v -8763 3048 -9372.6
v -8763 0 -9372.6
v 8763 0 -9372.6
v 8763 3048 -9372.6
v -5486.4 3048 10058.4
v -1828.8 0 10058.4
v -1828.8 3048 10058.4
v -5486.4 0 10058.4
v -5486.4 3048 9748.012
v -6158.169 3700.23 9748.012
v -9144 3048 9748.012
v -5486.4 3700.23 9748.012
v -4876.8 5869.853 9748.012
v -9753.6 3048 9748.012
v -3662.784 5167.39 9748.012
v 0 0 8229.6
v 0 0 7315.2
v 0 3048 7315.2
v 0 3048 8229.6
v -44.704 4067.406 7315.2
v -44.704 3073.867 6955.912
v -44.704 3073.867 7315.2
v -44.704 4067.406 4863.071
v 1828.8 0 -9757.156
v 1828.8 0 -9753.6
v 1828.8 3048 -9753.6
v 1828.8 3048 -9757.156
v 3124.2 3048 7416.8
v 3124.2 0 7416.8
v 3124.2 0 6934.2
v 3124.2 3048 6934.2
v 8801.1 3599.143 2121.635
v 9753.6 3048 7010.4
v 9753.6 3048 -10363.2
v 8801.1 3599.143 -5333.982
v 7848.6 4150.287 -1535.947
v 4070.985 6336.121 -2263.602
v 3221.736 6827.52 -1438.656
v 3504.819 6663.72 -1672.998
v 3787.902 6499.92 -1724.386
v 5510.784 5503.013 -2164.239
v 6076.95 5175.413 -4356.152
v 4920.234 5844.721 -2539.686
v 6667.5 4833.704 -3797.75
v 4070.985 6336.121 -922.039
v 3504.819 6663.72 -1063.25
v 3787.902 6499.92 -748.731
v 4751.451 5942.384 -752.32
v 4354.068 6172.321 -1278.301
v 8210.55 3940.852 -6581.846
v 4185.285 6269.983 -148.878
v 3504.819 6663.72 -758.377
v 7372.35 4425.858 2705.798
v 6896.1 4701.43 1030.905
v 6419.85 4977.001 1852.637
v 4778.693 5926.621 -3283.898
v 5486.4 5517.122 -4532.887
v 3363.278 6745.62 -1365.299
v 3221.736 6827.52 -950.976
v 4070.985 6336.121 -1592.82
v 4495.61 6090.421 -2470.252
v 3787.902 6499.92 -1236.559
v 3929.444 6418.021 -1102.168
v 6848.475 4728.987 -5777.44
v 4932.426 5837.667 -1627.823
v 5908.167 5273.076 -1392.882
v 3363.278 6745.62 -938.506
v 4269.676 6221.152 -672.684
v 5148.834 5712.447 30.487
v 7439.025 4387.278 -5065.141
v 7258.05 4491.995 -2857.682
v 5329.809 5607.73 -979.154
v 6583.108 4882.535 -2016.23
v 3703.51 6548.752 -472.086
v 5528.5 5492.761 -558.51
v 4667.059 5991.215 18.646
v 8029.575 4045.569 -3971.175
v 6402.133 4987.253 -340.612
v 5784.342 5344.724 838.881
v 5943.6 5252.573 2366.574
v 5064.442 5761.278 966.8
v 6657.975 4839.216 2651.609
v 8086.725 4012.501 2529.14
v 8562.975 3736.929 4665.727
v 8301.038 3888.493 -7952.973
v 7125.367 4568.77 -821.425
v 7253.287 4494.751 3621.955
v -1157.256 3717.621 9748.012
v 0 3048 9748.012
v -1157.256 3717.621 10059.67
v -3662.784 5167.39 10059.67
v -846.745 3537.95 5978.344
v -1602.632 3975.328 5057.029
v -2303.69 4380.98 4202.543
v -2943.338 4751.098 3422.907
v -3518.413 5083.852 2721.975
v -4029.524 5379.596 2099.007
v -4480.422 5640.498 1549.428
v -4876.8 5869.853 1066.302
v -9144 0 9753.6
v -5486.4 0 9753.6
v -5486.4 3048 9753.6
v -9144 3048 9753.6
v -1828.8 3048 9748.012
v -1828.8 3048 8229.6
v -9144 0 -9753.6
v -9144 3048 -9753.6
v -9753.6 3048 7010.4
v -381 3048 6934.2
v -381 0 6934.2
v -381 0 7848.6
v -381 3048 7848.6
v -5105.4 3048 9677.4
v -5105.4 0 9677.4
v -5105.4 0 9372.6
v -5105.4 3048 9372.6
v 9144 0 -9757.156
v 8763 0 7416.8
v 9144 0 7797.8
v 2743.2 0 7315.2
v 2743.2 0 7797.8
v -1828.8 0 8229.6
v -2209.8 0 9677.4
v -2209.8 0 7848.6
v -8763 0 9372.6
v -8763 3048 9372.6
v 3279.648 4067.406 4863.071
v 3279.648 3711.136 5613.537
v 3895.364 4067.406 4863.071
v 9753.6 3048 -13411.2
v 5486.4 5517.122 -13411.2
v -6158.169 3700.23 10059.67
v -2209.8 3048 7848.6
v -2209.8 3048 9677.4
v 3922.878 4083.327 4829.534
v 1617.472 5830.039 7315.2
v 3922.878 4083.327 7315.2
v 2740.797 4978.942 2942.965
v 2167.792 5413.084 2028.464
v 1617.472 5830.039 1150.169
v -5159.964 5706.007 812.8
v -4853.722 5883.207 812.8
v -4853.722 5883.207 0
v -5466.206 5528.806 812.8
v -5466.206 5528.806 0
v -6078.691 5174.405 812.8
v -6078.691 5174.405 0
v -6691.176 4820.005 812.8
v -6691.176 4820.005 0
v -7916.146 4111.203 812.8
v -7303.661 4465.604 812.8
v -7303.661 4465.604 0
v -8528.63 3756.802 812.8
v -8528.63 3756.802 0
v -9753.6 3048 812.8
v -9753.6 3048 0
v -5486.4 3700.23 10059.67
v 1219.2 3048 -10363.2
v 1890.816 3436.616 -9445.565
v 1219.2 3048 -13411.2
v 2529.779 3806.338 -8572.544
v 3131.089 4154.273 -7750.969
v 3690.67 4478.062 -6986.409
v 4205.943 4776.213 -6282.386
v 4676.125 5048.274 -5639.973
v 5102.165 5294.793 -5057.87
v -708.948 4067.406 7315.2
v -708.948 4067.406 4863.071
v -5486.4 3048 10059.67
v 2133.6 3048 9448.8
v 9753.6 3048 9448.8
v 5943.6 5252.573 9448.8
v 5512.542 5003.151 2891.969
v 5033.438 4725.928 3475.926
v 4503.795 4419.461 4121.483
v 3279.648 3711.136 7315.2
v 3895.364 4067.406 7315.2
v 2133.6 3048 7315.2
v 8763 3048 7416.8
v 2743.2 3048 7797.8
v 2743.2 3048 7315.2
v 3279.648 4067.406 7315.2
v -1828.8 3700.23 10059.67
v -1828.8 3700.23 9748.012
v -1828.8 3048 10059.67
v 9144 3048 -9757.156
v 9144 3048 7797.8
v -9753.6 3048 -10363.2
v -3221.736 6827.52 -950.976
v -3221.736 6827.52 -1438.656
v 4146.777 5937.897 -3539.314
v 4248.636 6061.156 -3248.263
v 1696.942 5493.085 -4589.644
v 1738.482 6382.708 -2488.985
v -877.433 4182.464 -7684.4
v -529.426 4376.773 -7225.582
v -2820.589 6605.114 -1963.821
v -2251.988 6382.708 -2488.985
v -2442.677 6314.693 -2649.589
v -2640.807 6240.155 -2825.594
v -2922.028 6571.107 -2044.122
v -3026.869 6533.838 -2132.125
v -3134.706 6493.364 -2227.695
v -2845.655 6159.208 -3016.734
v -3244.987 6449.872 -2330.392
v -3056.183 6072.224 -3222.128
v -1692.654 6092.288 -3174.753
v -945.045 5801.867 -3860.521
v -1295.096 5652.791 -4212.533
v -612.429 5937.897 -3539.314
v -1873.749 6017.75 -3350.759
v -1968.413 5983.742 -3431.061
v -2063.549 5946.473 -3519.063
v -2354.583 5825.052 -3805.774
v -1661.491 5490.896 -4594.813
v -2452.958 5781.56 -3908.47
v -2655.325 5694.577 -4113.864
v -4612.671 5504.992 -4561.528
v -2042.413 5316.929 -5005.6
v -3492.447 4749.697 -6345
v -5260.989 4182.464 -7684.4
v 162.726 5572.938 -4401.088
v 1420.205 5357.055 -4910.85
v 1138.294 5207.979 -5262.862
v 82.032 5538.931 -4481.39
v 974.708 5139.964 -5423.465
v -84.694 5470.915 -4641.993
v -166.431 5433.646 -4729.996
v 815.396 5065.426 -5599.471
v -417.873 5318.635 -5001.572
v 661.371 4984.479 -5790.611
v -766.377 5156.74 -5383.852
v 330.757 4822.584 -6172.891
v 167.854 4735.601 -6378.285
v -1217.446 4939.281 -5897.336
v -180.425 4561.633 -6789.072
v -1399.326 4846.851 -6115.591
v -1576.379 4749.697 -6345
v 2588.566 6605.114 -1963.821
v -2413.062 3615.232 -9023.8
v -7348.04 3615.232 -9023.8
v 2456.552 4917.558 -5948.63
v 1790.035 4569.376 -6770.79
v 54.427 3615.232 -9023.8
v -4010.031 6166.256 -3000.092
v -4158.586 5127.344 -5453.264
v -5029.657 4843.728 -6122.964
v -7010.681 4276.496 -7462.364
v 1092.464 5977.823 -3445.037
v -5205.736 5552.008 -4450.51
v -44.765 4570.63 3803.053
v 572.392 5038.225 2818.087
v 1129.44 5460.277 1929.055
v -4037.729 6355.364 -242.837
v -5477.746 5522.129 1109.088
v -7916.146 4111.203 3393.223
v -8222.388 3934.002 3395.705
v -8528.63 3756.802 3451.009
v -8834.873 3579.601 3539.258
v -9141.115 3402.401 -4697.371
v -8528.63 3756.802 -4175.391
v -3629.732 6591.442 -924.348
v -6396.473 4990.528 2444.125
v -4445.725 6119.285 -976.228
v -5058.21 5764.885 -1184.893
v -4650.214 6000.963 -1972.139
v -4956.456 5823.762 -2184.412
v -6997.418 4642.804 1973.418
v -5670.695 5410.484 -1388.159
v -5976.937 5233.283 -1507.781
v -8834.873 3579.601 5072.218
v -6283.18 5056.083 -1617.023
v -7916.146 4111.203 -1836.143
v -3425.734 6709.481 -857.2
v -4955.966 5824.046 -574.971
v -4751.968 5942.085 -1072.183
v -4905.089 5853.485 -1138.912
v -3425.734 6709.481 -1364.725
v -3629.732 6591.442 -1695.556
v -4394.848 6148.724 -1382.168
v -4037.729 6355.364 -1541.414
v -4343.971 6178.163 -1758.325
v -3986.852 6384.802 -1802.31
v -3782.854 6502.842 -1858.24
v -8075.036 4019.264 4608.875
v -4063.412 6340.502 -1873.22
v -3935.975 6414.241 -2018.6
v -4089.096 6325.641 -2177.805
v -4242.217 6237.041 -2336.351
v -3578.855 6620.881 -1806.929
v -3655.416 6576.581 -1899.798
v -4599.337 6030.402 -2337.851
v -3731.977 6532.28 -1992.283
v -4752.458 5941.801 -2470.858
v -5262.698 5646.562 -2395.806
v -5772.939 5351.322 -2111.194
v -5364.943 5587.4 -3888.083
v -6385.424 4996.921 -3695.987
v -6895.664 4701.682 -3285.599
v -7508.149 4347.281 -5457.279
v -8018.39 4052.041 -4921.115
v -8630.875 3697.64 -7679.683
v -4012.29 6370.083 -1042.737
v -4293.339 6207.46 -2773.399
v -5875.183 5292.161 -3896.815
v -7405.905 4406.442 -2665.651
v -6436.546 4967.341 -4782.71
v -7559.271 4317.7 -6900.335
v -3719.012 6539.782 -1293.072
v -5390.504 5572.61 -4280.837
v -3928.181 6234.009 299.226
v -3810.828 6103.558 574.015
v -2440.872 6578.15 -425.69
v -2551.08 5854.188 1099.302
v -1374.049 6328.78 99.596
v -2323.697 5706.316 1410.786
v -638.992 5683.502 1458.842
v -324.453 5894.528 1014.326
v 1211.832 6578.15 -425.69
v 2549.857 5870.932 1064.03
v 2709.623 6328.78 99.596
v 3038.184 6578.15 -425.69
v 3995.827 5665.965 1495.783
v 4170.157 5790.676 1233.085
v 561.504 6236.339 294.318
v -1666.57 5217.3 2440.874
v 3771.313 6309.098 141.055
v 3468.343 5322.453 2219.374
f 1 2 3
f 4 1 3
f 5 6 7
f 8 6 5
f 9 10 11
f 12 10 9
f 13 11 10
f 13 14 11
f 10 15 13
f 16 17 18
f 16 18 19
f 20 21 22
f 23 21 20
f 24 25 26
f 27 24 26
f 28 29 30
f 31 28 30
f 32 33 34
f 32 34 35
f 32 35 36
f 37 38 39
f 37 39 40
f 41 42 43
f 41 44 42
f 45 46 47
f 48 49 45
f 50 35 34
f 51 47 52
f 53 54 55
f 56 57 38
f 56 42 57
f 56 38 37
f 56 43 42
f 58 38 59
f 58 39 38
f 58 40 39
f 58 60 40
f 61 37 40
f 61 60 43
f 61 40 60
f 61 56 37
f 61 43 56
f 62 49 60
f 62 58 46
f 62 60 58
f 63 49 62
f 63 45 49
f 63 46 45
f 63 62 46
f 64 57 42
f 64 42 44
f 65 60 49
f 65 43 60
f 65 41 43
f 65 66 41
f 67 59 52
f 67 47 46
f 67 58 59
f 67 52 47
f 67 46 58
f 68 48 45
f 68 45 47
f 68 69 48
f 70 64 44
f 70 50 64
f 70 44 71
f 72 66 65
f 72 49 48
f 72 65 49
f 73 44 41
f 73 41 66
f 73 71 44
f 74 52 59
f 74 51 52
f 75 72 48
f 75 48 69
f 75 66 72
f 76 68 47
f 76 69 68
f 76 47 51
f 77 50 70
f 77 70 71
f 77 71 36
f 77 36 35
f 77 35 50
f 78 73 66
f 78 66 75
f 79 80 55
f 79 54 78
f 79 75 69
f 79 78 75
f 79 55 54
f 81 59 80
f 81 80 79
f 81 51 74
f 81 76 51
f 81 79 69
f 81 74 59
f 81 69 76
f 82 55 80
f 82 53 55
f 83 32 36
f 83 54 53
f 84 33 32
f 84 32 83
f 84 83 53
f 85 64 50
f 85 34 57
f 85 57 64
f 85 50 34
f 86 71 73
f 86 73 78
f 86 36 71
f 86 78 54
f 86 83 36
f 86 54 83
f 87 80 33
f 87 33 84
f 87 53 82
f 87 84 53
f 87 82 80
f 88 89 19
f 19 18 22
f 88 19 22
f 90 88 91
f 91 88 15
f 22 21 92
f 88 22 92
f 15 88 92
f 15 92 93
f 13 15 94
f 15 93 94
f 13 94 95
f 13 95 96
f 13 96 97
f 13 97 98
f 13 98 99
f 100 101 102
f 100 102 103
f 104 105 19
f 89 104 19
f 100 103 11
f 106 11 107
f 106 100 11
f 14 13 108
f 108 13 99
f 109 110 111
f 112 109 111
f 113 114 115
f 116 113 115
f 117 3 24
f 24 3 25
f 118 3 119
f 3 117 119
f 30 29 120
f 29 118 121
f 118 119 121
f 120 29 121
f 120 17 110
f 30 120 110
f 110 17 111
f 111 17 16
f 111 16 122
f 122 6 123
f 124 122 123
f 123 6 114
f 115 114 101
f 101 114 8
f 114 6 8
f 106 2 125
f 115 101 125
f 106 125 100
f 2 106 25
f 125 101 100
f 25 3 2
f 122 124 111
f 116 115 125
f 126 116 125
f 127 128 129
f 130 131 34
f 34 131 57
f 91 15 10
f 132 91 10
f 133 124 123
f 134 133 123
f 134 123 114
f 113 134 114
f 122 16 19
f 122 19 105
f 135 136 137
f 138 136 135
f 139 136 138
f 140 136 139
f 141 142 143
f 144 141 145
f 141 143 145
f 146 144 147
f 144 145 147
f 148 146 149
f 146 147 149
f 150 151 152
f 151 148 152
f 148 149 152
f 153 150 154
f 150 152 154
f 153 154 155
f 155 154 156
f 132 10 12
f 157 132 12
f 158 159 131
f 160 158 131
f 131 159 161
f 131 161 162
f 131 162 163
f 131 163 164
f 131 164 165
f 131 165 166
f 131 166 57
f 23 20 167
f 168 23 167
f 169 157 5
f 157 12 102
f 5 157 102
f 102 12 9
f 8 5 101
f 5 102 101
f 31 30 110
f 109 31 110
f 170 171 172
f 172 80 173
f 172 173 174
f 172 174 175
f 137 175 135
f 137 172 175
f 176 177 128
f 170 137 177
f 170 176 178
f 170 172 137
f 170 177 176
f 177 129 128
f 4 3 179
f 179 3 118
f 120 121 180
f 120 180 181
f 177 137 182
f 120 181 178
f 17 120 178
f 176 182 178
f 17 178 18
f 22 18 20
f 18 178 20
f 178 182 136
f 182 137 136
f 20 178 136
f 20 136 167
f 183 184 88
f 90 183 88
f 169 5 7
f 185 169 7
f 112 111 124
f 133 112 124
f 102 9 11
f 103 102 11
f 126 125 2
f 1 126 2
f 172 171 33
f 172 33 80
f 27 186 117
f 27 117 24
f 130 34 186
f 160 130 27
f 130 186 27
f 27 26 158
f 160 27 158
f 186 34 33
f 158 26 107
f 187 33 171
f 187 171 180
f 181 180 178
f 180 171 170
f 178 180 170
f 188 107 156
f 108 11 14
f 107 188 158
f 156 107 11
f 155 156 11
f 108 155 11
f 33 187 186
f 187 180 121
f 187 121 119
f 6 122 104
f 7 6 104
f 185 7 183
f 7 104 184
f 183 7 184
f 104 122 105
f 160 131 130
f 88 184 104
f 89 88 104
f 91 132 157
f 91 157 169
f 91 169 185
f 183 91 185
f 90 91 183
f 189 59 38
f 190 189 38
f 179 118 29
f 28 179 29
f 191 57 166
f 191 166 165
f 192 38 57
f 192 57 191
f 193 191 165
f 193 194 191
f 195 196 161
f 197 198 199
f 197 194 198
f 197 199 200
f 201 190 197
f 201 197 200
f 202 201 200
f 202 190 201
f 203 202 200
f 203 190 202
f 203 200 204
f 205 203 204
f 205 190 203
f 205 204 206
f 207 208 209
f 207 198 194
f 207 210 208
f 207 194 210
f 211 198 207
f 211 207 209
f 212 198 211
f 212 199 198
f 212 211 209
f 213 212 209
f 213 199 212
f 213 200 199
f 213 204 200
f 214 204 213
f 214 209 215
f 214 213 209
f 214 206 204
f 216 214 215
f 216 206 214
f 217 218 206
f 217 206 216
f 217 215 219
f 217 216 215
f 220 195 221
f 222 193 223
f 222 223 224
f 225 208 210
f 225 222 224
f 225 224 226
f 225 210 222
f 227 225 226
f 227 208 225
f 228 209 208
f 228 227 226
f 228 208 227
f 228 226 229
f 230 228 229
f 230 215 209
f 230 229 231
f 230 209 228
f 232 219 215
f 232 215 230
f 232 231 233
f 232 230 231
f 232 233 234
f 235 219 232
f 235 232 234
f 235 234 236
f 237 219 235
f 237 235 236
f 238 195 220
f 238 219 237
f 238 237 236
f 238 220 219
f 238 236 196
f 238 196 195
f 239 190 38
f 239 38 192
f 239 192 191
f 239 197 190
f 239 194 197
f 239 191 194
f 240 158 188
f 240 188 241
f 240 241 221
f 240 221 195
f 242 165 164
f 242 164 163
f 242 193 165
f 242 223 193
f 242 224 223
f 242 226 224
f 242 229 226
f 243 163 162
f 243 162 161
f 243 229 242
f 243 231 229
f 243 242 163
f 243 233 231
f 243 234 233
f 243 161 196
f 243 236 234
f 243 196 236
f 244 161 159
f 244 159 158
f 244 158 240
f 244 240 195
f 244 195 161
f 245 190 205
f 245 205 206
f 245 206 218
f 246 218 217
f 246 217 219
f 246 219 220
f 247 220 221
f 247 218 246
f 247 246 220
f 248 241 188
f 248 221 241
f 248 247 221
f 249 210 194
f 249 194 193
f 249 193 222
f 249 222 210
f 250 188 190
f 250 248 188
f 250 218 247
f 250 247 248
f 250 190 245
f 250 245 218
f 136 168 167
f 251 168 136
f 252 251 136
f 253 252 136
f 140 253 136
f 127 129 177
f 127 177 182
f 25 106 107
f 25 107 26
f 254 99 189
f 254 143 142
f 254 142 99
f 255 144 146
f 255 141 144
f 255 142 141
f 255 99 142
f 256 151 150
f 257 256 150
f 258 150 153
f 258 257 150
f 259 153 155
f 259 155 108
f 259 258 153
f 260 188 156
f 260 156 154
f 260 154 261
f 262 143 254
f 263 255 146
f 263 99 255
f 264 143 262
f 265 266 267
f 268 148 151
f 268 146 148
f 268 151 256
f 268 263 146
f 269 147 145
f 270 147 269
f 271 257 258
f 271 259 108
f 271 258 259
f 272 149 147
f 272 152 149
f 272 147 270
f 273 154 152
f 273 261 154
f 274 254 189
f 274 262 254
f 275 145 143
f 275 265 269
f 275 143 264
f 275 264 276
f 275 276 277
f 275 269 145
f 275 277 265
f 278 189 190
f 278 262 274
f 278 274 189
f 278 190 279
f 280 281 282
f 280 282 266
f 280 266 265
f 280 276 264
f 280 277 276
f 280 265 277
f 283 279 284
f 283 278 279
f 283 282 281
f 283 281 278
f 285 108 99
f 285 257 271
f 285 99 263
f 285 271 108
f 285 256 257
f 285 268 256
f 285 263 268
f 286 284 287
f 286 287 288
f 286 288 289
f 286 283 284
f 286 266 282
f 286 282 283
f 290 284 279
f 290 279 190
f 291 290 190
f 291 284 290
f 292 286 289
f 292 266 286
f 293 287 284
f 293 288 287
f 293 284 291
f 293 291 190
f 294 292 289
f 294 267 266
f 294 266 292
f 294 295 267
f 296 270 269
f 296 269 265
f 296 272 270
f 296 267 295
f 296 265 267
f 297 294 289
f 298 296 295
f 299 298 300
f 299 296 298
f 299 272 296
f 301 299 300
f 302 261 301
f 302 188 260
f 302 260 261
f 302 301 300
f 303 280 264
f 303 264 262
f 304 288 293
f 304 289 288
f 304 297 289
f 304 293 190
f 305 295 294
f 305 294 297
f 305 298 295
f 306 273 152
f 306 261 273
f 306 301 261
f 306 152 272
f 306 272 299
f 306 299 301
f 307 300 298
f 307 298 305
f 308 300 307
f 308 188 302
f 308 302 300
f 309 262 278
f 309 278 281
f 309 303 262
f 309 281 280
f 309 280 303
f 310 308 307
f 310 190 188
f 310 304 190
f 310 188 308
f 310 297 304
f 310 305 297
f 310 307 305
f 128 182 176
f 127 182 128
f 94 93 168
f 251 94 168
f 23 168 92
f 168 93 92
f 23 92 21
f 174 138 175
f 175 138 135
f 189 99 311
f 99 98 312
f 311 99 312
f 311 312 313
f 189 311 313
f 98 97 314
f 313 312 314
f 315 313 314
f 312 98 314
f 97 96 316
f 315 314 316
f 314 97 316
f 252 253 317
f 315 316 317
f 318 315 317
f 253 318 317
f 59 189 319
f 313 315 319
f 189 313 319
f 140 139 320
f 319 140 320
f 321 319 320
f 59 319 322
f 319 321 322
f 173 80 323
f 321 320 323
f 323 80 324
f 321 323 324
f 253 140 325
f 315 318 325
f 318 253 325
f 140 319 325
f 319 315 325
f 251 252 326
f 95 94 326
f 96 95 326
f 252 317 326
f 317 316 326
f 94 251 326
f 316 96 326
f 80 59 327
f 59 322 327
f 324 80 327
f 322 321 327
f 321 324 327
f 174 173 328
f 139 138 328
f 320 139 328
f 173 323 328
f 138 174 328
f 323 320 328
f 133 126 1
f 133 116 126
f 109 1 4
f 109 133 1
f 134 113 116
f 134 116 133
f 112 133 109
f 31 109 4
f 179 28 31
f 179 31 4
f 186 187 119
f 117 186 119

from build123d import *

# Parameters (mm, degrees)
BOSS_EXTRUDE1_DEPTH = 3048
BOSS_EXTRUDE2_START = -5486.4
BOSS_EXTRUDE2_DEPTH = 9144
BOSS_EXTRUDE4_DEPTH = 7315.2
BOSS_EXTRUDE5_DEPTH = 11294.618
BOSS_EXTRUDE6_DEPTH = 812.8
BOSS_EXTRUDE7_DEPTH = 9748.012
BOSS_EXTRUDE8_DEPTH = 311.658
SKETCH15_W          = 7315.2
SKETCH15_H          = 3048
CUT_EXTRUDE1_DEPTH  = 3654.044
SKETCH16_W          = 6400.8
SKETCH16_H          = 3048
CUT_EXTRUDE2_DEPTH  = 1651
CUT_EXTRUDE3_DEPTH  = 3048


with BuildPart() as part:
    # Sketch1 → Boss-Extrude1 (new body)
    with BuildSketch(Plane(origin=(0, 0, 0), x_dir=(1, 0, 0), z_dir=(0, 1, 0))):
        Polygon((9144, -9448.8), (2743.2, -9448.8), (2743.2, -6400.8), (0, -6400.8), (0, -8229.6), (-1828.8, -8229.6), (-1828.8, -9753.6), (-1828.8, -10058.4), (-5486.4, -10058.4), (-5486.4, -9753.6), (-9144, -9753.6), (-9144, 9753.6), (9144, 9753.6), align=None)
    extrude(amount=BOSS_EXTRUDE1_DEPTH)

    # Boundary7: read off the stored shape, not the designer's step
    # Boundary7: loft between two sections, ruled curve by curve
    boundary7_from = [
        Edge.make_line((-3221.736, 6827.52, -1438.656), (3221.736, 6827.52, -1438.656)),
        Edge.make_line((3221.736, 6827.52, -1438.656), (3221.736, 6827.52, -950.976)),
        Edge.make_line((-3221.736, 6827.52, -950.976), (-3221.736, 6827.52, -1438.656)),
        Edge.make_line((-3221.736, 6827.52, -950.976), (3221.736, 6827.52, -950.976)),
    ]
    boundary7_to = [
        Edge.make_line((-9753.6, 3048, -10363.2), (9753.6, 3048, -10363.2)),
        Edge.make_line((9753.6, 3048, -10363.2), (9753.6, 3048, 7010.4)),
        Edge.make_line((-9753.6, 3048, 7010.4), (-9753.6, 3048, -10363.2)),
        Edge.make_line((-9753.6, 3048, 7010.4), (9753.6, 3048, 7010.4)),
    ]
    boundary7 = Solid(Shell([*[Face.make_surface_from_curves(boundary7_from[k], boundary7_to[k]) for k in range(4)], Face(Wire(boundary7_from)), Face(Wire(boundary7_to))]))
    add(boundary7)

    # Sketch5 → Boss-Extrude2 (add)
    with BuildSketch(Plane(origin=(0, 0, -9753.6), x_dir=(-1, 0, 0), z_dir=(0, 0, -1)).offset(BOSS_EXTRUDE2_START)):
        Polygon((-9144, 0), (-1828.8, 0), (-1828.8, 3048), (-1219.2, 3048), (-5486.4, 5517.121791881), (-9753.6, 3048), (-9144, 3048), align=None)
    extrude(amount=BOSS_EXTRUDE2_DEPTH)

    # Sketch9 → Boss-Extrude4 (add)
    with BuildSketch(Plane.XY):
        Polygon((3279.648, 0), (-44.704, 0), (-44.704, 4067.405922576), (-708.94759912, 4067.405922576), (1617.472, 5830.039231191), (3943.89159912, 4067.405922576), (3279.648, 4067.405922576), align=None)
    extrude(amount=BOSS_EXTRUDE4_DEPTH)

    # Sketch7 → Boss-Extrude5 (add)
    with BuildSketch(Plane.XY.offset(9448.8)):
        Polygon((2743.2, 0), (9144, 0), (9144, 3048), (9753.6, 3048), (5943.6, 5252.573028465), (2133.6, 3048), (2743.2, 3048), align=None)
    extrude(amount=-BOSS_EXTRUDE5_DEPTH)

    # Sketch11 → Boss-Extrude6 (add)
    with BuildSketch(Plane.XY):
        Polygon((-9753.6, 3048), (46.156697944, 3048), (-4853.721651028, 5883.207257454), align=None)
    extrude(amount=BOSS_EXTRUDE6_DEPTH)

    # Sketch12 → Boss-Extrude7 (add)
    with BuildSketch(Plane.XY):
        Polygon((-9753.6, 3048), (0, 3048), (-4876.8, 5869.853476435), align=None)
    extrude(amount=BOSS_EXTRUDE7_DEPTH)

    # Sketch13 → Boss-Extrude8 (add)
    with BuildSketch(Plane.XY.offset(9748.012)):
        Polygon((-1828.8, 3048), (-1828.8, 3700.230424559), (-1157.256283504, 3717.620994655), (-3662.784348589, 5167.389917055), (-6158.168855406, 3700.230424559), (-5486.4, 3700.230424559), (-5486.4, 3048), align=None)
    extrude(amount=BOSS_EXTRUDE8_DEPTH)

    # Sketch15 → Cut-Extrude1 (cut)
    with BuildSketch(Plane(origin=(0, 0, -13411.2), x_dir=(-1, 0, 0), z_dir=(0, 0, -1))):
        with Locations((-5486.4, 1524)):
            Rectangle(SKETCH15_W, SKETCH15_H)
    extrude(amount=-CUT_EXTRUDE1_DEPTH, mode=Mode.SUBTRACT)

    # Sketch16 → Cut-Extrude2 (cut)
    with BuildSketch(Plane.XY.offset(9448.8)):
        with Locations((5943.6, 1524)):
            Rectangle(SKETCH16_W, SKETCH16_H)
    extrude(amount=-CUT_EXTRUDE2_DEPTH, mode=Mode.SUBTRACT)

    # Sketch17 → Cut-Extrude3 (cut)
    with BuildSketch(Plane.XZ):
        Polygon((-8763, 9372.6), (-8763, -9372.6), (8763, -9372.6), (8763, 7416.8), (3124.2, 7416.8), (3124.2, 6934.2), (-381, 6934.2), (-381, 7848.6), (-2209.8, 7848.6), (-2209.8, 9677.4), (-5105.4, 9677.4), (-5105.4, 9372.6), align=None)
    extrude(amount=-CUT_EXTRUDE3_DEPTH, mode=Mode.SUBTRACT)


solid = part.part
